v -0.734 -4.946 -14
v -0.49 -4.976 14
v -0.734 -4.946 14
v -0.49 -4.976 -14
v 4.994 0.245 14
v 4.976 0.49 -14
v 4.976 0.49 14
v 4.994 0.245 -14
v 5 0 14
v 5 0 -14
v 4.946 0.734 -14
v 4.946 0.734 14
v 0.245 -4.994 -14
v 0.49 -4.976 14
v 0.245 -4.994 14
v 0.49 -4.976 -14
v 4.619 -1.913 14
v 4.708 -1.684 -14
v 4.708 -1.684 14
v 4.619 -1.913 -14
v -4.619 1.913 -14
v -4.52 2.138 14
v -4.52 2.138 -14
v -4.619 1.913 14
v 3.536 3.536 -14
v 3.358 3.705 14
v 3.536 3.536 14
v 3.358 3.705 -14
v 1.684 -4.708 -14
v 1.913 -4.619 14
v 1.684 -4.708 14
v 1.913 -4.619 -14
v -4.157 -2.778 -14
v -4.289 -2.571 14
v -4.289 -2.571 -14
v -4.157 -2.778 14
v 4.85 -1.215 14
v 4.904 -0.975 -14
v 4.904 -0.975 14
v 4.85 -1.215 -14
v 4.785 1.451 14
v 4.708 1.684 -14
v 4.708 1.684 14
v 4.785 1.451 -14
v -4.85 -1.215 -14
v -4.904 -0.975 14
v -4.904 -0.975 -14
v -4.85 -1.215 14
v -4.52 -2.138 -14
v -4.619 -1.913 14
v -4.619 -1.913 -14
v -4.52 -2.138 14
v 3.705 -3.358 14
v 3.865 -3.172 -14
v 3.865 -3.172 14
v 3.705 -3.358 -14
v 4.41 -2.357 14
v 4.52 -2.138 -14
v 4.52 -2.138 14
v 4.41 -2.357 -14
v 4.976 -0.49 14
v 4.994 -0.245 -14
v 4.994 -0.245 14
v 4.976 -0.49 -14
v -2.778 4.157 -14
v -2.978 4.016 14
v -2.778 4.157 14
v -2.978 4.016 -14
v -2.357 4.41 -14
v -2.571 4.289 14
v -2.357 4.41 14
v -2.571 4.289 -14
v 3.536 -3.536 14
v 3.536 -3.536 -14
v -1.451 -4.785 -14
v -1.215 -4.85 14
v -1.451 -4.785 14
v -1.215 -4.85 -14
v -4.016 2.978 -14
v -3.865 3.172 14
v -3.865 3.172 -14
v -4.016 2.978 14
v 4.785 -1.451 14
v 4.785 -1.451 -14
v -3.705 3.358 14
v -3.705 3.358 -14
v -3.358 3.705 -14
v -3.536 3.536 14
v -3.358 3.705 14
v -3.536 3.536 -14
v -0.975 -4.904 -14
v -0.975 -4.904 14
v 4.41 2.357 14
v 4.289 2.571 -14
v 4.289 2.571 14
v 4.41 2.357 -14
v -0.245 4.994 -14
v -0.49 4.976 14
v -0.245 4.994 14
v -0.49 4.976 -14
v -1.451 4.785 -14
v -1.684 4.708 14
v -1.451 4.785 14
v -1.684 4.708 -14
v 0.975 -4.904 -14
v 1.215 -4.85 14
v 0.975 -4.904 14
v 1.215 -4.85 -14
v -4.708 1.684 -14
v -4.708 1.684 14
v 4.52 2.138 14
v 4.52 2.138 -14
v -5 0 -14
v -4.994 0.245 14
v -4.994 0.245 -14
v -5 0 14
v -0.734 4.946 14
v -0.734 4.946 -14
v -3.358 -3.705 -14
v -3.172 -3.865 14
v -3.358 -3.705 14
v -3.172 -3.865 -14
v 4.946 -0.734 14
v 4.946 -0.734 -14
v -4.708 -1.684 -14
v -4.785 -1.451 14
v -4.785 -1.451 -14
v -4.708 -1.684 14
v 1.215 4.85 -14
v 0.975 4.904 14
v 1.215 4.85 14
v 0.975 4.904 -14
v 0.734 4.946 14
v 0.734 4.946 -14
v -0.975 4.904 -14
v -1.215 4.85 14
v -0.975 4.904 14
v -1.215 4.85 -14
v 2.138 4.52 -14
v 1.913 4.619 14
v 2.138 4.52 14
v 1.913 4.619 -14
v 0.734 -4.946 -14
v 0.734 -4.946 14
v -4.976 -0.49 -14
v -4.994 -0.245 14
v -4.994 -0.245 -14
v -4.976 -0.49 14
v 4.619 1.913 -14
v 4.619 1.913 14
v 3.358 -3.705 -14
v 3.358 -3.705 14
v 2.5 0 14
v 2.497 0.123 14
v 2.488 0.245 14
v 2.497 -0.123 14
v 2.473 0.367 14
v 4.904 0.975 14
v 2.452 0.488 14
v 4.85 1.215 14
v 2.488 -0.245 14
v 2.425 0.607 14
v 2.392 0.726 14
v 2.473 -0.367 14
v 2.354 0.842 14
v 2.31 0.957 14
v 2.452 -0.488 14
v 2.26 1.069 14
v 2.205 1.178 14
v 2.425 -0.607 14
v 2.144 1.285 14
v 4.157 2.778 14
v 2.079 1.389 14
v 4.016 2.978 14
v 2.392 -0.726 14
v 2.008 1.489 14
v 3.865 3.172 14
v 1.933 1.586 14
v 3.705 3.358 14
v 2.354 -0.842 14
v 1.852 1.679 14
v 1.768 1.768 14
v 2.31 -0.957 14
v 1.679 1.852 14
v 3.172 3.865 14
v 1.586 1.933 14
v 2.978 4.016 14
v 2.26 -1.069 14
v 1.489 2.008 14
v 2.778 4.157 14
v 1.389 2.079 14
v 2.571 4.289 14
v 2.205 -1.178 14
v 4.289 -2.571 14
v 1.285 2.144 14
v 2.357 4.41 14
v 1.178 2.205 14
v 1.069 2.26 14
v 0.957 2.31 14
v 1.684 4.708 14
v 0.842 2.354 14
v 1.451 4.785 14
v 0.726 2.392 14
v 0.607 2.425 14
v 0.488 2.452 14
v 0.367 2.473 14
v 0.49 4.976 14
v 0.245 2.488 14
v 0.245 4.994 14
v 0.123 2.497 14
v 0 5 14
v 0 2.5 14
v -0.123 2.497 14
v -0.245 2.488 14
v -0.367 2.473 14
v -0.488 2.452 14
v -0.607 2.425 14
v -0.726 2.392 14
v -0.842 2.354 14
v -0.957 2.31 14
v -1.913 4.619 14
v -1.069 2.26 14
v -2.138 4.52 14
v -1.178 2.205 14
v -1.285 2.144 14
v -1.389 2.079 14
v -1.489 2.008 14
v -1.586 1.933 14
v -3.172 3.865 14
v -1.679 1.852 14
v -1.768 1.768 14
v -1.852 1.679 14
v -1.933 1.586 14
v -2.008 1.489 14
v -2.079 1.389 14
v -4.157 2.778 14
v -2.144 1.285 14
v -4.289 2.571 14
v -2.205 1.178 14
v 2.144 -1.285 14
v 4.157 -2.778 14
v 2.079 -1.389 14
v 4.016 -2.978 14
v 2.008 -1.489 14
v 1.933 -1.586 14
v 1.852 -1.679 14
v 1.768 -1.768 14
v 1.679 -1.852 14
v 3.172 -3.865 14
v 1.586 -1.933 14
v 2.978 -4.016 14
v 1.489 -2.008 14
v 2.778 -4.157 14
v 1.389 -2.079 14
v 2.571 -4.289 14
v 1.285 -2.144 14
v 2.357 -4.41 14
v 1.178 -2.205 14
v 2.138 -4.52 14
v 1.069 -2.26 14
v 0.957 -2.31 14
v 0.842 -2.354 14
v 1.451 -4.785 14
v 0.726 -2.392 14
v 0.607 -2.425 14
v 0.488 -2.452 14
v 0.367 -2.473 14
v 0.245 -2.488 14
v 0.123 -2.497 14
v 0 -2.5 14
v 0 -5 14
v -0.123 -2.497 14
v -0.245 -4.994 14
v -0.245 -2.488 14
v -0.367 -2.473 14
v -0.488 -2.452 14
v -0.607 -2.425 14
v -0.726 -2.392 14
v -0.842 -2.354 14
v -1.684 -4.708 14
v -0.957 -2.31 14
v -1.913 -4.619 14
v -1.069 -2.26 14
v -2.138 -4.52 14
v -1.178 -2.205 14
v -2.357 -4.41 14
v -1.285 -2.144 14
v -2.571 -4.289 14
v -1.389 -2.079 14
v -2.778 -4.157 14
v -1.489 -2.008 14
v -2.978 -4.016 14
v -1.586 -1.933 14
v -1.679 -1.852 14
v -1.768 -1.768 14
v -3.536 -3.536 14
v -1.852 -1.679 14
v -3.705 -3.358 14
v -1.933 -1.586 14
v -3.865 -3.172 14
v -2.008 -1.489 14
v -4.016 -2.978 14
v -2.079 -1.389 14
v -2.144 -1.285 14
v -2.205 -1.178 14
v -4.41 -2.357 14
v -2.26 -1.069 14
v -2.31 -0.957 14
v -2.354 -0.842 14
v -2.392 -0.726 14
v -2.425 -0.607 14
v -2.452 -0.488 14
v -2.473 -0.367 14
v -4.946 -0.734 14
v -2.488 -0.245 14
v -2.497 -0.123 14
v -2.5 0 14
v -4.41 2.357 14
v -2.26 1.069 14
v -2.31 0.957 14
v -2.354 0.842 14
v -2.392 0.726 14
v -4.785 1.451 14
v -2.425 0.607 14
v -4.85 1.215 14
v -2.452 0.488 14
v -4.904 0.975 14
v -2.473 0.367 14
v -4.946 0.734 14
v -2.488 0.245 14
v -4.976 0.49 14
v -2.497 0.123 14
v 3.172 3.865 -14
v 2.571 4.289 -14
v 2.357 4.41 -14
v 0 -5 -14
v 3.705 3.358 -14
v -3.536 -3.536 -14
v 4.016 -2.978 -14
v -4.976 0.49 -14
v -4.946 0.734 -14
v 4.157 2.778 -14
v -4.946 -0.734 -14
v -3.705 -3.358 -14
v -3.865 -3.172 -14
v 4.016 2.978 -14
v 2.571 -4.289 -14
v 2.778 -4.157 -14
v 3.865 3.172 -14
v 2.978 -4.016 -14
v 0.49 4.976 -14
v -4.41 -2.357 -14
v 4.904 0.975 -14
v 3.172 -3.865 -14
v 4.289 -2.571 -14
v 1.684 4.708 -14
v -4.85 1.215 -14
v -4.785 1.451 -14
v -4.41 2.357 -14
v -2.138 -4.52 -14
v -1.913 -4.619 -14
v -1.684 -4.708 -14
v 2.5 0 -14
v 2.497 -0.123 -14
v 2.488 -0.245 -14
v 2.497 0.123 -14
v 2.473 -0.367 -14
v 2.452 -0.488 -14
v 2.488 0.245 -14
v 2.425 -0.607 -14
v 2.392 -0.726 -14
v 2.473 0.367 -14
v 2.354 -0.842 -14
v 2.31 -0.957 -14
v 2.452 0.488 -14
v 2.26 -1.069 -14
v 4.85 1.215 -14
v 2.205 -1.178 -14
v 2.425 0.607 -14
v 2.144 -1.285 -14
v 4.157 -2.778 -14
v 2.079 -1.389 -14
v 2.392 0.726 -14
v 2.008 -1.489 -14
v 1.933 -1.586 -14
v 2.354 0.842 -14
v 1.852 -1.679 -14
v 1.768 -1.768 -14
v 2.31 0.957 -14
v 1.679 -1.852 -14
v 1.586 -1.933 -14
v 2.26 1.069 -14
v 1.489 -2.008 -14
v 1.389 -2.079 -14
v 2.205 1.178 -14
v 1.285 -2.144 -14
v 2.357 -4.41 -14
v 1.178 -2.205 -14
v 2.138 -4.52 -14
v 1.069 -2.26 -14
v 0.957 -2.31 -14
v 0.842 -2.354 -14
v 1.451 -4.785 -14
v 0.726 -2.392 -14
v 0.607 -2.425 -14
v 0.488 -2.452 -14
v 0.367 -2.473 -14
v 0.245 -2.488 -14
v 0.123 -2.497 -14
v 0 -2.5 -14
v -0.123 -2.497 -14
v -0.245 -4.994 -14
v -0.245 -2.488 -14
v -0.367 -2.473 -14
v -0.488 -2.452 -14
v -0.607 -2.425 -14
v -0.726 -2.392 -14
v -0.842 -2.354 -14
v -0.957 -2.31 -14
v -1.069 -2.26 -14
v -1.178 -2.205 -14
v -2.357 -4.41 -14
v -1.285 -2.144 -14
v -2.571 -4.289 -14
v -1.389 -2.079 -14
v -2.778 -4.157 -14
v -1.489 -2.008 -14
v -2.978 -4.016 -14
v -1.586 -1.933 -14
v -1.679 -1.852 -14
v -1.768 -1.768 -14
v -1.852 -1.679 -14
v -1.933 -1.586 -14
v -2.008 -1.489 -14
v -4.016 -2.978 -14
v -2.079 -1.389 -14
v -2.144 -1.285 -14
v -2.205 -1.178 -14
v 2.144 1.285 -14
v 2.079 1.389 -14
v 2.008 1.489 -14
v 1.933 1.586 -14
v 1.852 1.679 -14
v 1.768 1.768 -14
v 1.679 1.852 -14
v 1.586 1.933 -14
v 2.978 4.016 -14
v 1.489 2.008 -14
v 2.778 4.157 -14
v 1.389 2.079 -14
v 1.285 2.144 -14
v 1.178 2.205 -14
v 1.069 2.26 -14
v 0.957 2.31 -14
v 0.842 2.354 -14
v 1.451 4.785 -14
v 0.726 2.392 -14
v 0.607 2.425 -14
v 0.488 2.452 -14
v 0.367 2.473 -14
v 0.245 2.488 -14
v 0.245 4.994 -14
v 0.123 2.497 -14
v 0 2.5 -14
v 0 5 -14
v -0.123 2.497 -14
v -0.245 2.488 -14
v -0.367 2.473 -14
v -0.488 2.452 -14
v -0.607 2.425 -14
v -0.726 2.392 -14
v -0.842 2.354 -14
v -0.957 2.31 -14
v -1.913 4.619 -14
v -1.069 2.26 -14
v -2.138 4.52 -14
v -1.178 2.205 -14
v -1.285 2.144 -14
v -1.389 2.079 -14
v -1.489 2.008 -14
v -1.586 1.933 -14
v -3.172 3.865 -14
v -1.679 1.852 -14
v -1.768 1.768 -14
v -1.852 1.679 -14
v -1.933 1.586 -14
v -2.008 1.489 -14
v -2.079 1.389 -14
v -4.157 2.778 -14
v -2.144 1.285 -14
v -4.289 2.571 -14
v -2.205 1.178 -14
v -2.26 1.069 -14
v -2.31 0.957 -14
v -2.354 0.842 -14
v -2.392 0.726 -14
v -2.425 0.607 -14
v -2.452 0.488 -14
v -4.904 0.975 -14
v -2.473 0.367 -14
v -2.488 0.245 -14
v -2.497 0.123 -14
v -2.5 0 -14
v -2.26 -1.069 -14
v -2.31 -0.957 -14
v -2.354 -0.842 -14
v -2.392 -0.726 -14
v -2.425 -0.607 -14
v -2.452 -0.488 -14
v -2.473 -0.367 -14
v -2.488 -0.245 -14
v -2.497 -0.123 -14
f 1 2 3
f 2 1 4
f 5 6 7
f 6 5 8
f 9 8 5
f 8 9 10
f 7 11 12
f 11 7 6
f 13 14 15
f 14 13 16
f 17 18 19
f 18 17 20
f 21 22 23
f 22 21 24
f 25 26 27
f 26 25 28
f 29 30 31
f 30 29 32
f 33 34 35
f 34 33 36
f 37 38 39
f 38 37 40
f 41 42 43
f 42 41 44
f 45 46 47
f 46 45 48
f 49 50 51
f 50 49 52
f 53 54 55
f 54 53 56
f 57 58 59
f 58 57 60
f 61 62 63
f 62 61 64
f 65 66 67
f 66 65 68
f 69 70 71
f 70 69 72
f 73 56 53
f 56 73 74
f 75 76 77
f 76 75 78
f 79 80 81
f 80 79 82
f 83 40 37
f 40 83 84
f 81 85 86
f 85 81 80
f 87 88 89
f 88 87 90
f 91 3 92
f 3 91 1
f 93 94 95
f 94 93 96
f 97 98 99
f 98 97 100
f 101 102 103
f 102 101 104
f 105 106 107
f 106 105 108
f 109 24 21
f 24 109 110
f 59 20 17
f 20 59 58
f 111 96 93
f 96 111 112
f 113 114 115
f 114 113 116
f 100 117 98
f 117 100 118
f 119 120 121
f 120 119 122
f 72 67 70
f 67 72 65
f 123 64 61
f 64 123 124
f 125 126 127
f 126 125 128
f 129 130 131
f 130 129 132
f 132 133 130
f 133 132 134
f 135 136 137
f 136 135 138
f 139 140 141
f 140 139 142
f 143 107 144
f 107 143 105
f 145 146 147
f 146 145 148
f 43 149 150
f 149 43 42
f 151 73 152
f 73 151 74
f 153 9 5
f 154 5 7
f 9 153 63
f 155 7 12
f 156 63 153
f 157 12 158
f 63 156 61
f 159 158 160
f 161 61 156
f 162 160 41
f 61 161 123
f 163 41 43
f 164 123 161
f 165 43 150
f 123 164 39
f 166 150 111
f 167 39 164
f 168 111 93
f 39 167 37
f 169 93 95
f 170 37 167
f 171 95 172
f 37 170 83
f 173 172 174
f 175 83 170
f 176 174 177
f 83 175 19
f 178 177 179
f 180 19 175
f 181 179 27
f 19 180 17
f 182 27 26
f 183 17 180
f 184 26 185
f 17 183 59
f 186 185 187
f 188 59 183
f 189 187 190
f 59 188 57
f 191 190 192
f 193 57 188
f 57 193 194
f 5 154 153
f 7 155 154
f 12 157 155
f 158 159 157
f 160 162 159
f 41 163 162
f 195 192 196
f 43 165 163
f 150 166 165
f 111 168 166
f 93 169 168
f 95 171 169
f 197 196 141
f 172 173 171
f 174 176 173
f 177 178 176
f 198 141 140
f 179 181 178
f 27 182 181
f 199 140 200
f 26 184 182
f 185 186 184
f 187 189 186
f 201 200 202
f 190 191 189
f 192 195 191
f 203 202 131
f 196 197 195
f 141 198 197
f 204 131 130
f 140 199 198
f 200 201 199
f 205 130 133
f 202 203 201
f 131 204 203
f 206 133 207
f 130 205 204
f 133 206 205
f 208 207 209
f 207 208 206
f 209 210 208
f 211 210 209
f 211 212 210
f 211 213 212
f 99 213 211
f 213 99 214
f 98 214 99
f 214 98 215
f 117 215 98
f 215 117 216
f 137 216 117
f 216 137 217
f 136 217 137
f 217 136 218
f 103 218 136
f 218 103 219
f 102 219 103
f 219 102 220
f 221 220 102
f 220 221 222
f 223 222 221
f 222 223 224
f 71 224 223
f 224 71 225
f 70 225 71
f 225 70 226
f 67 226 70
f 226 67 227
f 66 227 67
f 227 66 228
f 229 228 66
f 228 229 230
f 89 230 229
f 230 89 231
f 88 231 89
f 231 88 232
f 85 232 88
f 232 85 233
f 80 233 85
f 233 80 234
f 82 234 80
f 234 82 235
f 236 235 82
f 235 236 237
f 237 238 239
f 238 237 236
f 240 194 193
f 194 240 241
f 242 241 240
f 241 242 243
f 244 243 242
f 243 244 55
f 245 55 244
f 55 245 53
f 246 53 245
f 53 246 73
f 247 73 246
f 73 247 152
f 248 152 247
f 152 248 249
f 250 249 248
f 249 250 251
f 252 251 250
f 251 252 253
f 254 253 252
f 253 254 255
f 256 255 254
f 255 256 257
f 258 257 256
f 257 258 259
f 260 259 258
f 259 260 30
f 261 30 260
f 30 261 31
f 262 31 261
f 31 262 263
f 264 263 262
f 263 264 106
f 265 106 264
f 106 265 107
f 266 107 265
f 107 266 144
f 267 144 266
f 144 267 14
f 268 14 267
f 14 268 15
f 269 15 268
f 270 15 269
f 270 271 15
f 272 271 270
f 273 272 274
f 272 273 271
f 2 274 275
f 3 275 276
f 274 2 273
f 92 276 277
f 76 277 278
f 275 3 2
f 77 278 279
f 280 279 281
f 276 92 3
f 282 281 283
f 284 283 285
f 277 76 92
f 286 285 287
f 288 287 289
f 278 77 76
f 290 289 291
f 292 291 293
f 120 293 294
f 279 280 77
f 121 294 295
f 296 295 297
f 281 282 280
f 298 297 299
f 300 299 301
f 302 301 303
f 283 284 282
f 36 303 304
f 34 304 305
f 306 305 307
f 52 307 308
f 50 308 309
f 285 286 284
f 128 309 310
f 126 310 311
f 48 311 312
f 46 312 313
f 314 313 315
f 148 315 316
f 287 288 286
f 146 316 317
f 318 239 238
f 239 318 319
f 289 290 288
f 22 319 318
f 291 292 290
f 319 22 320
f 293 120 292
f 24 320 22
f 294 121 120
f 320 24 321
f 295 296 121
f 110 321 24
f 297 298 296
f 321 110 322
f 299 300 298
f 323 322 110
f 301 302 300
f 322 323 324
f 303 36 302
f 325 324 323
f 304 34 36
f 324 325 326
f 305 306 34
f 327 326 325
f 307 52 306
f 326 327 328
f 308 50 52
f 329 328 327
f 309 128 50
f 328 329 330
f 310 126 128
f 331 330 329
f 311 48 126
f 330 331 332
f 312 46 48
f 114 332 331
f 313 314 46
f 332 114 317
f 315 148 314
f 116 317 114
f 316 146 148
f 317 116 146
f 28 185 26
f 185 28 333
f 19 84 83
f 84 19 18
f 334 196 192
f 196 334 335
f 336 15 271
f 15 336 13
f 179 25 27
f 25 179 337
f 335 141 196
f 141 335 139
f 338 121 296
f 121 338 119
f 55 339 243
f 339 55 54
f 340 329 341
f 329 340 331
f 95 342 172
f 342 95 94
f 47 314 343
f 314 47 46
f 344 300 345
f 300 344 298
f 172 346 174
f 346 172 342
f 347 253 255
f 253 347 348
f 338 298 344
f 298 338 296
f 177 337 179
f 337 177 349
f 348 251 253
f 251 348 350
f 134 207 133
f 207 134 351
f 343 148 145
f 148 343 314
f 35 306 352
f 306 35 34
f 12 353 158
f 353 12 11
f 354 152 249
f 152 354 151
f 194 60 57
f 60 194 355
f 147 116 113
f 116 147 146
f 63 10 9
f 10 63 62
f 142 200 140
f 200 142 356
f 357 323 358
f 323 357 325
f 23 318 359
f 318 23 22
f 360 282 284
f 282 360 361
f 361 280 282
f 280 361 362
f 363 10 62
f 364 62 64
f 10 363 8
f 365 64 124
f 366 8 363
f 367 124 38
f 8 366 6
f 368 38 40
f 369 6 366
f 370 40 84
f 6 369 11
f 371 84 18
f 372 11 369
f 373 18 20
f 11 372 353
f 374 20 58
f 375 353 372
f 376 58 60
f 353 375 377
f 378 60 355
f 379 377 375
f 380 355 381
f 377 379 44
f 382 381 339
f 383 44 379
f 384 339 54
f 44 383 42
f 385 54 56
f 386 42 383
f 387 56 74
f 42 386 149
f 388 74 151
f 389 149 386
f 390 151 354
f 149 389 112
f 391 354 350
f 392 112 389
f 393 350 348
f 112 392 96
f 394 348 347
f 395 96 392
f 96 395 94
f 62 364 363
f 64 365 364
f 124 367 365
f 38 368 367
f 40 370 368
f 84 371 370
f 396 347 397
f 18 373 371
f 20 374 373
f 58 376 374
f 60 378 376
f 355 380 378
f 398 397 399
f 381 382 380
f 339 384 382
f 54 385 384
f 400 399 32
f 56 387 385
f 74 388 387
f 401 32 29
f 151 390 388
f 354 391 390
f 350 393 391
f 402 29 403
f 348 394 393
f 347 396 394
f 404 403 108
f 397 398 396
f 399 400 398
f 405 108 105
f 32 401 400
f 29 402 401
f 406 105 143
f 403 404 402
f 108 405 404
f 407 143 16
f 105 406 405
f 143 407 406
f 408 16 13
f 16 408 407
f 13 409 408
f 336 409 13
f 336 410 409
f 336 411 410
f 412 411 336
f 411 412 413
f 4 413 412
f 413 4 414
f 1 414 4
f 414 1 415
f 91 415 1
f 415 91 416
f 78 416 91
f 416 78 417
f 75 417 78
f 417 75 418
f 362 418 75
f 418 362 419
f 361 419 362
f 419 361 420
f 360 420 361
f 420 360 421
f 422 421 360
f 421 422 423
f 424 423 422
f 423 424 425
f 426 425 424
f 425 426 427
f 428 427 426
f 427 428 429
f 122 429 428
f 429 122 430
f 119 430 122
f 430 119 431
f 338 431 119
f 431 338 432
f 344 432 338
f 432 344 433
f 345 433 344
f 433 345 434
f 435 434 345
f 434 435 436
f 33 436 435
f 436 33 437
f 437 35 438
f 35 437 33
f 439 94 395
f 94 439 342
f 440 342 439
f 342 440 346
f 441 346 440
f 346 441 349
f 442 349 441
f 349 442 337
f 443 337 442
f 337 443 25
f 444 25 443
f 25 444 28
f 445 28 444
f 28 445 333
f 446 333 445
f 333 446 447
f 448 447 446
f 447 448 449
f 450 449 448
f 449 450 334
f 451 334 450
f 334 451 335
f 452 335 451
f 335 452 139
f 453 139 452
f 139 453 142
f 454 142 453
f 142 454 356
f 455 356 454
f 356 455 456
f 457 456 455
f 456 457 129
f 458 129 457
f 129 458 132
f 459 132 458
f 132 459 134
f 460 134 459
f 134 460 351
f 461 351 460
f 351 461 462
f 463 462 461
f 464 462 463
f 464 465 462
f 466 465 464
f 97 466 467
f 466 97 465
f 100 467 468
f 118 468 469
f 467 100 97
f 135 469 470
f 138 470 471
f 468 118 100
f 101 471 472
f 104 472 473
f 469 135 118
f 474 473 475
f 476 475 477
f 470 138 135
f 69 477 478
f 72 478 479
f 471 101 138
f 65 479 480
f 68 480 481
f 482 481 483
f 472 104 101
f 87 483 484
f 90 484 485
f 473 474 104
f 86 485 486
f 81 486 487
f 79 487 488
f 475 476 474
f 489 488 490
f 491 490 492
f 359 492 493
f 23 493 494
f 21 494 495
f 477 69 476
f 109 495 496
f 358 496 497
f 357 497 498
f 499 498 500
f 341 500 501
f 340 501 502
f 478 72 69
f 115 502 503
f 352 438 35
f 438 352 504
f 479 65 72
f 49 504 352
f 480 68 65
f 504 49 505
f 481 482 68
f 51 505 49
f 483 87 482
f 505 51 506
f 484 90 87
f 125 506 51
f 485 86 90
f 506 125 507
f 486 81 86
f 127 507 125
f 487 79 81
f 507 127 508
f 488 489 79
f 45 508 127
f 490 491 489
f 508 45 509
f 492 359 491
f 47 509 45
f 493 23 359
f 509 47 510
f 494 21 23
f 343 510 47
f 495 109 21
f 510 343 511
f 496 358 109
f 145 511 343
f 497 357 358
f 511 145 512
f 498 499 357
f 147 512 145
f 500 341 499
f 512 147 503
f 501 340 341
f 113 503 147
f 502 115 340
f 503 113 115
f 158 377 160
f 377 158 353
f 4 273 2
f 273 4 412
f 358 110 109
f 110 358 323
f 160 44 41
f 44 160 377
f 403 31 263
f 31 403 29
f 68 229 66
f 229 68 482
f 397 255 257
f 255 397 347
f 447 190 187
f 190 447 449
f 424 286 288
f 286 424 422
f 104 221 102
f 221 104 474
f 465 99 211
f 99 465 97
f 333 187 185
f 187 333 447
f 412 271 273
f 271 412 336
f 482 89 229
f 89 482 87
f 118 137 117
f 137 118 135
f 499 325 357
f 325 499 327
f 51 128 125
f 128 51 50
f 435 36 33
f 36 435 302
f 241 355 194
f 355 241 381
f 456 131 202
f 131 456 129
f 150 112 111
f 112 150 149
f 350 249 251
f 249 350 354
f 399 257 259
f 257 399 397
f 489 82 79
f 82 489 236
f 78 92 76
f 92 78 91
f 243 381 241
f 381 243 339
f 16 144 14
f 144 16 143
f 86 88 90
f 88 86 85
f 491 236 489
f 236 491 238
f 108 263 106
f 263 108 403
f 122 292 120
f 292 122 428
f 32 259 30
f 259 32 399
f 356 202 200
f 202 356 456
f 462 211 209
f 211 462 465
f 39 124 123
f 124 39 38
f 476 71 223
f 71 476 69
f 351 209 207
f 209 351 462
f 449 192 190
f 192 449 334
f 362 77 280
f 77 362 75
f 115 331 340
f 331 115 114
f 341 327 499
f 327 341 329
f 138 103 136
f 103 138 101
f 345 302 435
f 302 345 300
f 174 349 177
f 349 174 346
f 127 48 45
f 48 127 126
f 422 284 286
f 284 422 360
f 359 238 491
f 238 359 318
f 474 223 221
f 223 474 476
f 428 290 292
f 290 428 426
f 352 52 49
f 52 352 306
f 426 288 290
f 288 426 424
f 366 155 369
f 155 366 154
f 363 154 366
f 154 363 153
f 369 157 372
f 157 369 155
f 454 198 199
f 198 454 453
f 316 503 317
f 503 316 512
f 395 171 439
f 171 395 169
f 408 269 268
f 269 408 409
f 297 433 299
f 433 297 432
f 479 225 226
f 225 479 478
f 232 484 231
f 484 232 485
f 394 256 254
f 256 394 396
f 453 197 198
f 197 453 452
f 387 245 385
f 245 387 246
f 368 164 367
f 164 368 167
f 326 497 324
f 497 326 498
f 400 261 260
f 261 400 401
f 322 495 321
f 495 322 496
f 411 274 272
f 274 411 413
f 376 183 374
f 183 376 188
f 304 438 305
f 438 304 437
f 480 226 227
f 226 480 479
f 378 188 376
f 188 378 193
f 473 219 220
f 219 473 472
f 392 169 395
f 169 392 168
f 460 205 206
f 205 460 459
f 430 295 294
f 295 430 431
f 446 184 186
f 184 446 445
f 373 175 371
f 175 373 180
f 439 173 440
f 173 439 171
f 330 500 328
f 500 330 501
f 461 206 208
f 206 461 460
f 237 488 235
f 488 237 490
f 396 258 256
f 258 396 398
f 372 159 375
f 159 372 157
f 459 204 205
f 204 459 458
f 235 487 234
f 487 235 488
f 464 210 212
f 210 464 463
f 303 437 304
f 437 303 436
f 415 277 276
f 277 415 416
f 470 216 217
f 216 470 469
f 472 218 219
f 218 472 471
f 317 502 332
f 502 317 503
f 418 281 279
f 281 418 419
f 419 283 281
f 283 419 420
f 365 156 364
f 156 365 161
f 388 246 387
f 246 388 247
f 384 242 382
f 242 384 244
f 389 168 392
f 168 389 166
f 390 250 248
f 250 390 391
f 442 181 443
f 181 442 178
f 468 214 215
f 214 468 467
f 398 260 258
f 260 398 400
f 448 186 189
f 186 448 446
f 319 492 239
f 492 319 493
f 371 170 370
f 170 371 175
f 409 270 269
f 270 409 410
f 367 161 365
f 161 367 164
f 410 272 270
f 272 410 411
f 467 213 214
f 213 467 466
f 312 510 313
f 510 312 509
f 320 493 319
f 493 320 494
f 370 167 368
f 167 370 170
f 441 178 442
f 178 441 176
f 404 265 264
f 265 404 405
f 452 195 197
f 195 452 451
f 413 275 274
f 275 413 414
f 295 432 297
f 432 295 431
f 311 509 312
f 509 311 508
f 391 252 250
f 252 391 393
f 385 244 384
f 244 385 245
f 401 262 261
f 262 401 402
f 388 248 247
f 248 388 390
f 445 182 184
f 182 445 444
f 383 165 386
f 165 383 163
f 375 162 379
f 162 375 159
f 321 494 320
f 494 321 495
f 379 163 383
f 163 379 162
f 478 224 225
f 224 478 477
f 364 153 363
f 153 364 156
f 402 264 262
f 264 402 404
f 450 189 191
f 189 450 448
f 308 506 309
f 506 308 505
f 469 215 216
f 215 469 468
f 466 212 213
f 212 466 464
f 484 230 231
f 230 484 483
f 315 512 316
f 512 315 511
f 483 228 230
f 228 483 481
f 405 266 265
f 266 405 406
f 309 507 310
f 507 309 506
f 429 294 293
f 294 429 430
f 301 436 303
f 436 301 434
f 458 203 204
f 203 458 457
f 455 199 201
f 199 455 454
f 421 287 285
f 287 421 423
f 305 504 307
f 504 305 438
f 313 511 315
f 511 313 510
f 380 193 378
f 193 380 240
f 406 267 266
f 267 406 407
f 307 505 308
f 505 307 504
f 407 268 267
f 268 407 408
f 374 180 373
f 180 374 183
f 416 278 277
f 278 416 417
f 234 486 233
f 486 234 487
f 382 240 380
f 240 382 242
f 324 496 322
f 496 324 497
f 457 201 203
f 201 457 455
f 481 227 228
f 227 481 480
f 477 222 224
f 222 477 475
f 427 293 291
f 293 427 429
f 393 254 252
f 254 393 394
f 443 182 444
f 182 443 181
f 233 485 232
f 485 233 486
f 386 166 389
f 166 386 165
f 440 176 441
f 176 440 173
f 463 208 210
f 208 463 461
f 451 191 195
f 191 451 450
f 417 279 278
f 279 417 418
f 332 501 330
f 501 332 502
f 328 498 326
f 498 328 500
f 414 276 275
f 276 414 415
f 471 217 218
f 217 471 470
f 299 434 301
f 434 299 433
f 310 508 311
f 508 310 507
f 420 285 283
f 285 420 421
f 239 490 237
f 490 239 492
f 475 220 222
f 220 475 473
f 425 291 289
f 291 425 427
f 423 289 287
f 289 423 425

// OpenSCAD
$fn = 128;

// Parameters (mm)
inner_bore_diameter = 5.0;
outer_diameter      = 10.0;
length              = 28.0;

// Small extra to guarantee clean boolean cuts
eps = 0.02;

module linear_bearing() {
    difference() {
        // Outer body (single connected solid)
        cylinder(h = length, d = outer_diameter, center = true);

        // Through bore (cut fully through with margin)
        cylinder(h = length + 2*eps, d = inner_bore_diameter, center = true);
    }
}

linear_bearing();
